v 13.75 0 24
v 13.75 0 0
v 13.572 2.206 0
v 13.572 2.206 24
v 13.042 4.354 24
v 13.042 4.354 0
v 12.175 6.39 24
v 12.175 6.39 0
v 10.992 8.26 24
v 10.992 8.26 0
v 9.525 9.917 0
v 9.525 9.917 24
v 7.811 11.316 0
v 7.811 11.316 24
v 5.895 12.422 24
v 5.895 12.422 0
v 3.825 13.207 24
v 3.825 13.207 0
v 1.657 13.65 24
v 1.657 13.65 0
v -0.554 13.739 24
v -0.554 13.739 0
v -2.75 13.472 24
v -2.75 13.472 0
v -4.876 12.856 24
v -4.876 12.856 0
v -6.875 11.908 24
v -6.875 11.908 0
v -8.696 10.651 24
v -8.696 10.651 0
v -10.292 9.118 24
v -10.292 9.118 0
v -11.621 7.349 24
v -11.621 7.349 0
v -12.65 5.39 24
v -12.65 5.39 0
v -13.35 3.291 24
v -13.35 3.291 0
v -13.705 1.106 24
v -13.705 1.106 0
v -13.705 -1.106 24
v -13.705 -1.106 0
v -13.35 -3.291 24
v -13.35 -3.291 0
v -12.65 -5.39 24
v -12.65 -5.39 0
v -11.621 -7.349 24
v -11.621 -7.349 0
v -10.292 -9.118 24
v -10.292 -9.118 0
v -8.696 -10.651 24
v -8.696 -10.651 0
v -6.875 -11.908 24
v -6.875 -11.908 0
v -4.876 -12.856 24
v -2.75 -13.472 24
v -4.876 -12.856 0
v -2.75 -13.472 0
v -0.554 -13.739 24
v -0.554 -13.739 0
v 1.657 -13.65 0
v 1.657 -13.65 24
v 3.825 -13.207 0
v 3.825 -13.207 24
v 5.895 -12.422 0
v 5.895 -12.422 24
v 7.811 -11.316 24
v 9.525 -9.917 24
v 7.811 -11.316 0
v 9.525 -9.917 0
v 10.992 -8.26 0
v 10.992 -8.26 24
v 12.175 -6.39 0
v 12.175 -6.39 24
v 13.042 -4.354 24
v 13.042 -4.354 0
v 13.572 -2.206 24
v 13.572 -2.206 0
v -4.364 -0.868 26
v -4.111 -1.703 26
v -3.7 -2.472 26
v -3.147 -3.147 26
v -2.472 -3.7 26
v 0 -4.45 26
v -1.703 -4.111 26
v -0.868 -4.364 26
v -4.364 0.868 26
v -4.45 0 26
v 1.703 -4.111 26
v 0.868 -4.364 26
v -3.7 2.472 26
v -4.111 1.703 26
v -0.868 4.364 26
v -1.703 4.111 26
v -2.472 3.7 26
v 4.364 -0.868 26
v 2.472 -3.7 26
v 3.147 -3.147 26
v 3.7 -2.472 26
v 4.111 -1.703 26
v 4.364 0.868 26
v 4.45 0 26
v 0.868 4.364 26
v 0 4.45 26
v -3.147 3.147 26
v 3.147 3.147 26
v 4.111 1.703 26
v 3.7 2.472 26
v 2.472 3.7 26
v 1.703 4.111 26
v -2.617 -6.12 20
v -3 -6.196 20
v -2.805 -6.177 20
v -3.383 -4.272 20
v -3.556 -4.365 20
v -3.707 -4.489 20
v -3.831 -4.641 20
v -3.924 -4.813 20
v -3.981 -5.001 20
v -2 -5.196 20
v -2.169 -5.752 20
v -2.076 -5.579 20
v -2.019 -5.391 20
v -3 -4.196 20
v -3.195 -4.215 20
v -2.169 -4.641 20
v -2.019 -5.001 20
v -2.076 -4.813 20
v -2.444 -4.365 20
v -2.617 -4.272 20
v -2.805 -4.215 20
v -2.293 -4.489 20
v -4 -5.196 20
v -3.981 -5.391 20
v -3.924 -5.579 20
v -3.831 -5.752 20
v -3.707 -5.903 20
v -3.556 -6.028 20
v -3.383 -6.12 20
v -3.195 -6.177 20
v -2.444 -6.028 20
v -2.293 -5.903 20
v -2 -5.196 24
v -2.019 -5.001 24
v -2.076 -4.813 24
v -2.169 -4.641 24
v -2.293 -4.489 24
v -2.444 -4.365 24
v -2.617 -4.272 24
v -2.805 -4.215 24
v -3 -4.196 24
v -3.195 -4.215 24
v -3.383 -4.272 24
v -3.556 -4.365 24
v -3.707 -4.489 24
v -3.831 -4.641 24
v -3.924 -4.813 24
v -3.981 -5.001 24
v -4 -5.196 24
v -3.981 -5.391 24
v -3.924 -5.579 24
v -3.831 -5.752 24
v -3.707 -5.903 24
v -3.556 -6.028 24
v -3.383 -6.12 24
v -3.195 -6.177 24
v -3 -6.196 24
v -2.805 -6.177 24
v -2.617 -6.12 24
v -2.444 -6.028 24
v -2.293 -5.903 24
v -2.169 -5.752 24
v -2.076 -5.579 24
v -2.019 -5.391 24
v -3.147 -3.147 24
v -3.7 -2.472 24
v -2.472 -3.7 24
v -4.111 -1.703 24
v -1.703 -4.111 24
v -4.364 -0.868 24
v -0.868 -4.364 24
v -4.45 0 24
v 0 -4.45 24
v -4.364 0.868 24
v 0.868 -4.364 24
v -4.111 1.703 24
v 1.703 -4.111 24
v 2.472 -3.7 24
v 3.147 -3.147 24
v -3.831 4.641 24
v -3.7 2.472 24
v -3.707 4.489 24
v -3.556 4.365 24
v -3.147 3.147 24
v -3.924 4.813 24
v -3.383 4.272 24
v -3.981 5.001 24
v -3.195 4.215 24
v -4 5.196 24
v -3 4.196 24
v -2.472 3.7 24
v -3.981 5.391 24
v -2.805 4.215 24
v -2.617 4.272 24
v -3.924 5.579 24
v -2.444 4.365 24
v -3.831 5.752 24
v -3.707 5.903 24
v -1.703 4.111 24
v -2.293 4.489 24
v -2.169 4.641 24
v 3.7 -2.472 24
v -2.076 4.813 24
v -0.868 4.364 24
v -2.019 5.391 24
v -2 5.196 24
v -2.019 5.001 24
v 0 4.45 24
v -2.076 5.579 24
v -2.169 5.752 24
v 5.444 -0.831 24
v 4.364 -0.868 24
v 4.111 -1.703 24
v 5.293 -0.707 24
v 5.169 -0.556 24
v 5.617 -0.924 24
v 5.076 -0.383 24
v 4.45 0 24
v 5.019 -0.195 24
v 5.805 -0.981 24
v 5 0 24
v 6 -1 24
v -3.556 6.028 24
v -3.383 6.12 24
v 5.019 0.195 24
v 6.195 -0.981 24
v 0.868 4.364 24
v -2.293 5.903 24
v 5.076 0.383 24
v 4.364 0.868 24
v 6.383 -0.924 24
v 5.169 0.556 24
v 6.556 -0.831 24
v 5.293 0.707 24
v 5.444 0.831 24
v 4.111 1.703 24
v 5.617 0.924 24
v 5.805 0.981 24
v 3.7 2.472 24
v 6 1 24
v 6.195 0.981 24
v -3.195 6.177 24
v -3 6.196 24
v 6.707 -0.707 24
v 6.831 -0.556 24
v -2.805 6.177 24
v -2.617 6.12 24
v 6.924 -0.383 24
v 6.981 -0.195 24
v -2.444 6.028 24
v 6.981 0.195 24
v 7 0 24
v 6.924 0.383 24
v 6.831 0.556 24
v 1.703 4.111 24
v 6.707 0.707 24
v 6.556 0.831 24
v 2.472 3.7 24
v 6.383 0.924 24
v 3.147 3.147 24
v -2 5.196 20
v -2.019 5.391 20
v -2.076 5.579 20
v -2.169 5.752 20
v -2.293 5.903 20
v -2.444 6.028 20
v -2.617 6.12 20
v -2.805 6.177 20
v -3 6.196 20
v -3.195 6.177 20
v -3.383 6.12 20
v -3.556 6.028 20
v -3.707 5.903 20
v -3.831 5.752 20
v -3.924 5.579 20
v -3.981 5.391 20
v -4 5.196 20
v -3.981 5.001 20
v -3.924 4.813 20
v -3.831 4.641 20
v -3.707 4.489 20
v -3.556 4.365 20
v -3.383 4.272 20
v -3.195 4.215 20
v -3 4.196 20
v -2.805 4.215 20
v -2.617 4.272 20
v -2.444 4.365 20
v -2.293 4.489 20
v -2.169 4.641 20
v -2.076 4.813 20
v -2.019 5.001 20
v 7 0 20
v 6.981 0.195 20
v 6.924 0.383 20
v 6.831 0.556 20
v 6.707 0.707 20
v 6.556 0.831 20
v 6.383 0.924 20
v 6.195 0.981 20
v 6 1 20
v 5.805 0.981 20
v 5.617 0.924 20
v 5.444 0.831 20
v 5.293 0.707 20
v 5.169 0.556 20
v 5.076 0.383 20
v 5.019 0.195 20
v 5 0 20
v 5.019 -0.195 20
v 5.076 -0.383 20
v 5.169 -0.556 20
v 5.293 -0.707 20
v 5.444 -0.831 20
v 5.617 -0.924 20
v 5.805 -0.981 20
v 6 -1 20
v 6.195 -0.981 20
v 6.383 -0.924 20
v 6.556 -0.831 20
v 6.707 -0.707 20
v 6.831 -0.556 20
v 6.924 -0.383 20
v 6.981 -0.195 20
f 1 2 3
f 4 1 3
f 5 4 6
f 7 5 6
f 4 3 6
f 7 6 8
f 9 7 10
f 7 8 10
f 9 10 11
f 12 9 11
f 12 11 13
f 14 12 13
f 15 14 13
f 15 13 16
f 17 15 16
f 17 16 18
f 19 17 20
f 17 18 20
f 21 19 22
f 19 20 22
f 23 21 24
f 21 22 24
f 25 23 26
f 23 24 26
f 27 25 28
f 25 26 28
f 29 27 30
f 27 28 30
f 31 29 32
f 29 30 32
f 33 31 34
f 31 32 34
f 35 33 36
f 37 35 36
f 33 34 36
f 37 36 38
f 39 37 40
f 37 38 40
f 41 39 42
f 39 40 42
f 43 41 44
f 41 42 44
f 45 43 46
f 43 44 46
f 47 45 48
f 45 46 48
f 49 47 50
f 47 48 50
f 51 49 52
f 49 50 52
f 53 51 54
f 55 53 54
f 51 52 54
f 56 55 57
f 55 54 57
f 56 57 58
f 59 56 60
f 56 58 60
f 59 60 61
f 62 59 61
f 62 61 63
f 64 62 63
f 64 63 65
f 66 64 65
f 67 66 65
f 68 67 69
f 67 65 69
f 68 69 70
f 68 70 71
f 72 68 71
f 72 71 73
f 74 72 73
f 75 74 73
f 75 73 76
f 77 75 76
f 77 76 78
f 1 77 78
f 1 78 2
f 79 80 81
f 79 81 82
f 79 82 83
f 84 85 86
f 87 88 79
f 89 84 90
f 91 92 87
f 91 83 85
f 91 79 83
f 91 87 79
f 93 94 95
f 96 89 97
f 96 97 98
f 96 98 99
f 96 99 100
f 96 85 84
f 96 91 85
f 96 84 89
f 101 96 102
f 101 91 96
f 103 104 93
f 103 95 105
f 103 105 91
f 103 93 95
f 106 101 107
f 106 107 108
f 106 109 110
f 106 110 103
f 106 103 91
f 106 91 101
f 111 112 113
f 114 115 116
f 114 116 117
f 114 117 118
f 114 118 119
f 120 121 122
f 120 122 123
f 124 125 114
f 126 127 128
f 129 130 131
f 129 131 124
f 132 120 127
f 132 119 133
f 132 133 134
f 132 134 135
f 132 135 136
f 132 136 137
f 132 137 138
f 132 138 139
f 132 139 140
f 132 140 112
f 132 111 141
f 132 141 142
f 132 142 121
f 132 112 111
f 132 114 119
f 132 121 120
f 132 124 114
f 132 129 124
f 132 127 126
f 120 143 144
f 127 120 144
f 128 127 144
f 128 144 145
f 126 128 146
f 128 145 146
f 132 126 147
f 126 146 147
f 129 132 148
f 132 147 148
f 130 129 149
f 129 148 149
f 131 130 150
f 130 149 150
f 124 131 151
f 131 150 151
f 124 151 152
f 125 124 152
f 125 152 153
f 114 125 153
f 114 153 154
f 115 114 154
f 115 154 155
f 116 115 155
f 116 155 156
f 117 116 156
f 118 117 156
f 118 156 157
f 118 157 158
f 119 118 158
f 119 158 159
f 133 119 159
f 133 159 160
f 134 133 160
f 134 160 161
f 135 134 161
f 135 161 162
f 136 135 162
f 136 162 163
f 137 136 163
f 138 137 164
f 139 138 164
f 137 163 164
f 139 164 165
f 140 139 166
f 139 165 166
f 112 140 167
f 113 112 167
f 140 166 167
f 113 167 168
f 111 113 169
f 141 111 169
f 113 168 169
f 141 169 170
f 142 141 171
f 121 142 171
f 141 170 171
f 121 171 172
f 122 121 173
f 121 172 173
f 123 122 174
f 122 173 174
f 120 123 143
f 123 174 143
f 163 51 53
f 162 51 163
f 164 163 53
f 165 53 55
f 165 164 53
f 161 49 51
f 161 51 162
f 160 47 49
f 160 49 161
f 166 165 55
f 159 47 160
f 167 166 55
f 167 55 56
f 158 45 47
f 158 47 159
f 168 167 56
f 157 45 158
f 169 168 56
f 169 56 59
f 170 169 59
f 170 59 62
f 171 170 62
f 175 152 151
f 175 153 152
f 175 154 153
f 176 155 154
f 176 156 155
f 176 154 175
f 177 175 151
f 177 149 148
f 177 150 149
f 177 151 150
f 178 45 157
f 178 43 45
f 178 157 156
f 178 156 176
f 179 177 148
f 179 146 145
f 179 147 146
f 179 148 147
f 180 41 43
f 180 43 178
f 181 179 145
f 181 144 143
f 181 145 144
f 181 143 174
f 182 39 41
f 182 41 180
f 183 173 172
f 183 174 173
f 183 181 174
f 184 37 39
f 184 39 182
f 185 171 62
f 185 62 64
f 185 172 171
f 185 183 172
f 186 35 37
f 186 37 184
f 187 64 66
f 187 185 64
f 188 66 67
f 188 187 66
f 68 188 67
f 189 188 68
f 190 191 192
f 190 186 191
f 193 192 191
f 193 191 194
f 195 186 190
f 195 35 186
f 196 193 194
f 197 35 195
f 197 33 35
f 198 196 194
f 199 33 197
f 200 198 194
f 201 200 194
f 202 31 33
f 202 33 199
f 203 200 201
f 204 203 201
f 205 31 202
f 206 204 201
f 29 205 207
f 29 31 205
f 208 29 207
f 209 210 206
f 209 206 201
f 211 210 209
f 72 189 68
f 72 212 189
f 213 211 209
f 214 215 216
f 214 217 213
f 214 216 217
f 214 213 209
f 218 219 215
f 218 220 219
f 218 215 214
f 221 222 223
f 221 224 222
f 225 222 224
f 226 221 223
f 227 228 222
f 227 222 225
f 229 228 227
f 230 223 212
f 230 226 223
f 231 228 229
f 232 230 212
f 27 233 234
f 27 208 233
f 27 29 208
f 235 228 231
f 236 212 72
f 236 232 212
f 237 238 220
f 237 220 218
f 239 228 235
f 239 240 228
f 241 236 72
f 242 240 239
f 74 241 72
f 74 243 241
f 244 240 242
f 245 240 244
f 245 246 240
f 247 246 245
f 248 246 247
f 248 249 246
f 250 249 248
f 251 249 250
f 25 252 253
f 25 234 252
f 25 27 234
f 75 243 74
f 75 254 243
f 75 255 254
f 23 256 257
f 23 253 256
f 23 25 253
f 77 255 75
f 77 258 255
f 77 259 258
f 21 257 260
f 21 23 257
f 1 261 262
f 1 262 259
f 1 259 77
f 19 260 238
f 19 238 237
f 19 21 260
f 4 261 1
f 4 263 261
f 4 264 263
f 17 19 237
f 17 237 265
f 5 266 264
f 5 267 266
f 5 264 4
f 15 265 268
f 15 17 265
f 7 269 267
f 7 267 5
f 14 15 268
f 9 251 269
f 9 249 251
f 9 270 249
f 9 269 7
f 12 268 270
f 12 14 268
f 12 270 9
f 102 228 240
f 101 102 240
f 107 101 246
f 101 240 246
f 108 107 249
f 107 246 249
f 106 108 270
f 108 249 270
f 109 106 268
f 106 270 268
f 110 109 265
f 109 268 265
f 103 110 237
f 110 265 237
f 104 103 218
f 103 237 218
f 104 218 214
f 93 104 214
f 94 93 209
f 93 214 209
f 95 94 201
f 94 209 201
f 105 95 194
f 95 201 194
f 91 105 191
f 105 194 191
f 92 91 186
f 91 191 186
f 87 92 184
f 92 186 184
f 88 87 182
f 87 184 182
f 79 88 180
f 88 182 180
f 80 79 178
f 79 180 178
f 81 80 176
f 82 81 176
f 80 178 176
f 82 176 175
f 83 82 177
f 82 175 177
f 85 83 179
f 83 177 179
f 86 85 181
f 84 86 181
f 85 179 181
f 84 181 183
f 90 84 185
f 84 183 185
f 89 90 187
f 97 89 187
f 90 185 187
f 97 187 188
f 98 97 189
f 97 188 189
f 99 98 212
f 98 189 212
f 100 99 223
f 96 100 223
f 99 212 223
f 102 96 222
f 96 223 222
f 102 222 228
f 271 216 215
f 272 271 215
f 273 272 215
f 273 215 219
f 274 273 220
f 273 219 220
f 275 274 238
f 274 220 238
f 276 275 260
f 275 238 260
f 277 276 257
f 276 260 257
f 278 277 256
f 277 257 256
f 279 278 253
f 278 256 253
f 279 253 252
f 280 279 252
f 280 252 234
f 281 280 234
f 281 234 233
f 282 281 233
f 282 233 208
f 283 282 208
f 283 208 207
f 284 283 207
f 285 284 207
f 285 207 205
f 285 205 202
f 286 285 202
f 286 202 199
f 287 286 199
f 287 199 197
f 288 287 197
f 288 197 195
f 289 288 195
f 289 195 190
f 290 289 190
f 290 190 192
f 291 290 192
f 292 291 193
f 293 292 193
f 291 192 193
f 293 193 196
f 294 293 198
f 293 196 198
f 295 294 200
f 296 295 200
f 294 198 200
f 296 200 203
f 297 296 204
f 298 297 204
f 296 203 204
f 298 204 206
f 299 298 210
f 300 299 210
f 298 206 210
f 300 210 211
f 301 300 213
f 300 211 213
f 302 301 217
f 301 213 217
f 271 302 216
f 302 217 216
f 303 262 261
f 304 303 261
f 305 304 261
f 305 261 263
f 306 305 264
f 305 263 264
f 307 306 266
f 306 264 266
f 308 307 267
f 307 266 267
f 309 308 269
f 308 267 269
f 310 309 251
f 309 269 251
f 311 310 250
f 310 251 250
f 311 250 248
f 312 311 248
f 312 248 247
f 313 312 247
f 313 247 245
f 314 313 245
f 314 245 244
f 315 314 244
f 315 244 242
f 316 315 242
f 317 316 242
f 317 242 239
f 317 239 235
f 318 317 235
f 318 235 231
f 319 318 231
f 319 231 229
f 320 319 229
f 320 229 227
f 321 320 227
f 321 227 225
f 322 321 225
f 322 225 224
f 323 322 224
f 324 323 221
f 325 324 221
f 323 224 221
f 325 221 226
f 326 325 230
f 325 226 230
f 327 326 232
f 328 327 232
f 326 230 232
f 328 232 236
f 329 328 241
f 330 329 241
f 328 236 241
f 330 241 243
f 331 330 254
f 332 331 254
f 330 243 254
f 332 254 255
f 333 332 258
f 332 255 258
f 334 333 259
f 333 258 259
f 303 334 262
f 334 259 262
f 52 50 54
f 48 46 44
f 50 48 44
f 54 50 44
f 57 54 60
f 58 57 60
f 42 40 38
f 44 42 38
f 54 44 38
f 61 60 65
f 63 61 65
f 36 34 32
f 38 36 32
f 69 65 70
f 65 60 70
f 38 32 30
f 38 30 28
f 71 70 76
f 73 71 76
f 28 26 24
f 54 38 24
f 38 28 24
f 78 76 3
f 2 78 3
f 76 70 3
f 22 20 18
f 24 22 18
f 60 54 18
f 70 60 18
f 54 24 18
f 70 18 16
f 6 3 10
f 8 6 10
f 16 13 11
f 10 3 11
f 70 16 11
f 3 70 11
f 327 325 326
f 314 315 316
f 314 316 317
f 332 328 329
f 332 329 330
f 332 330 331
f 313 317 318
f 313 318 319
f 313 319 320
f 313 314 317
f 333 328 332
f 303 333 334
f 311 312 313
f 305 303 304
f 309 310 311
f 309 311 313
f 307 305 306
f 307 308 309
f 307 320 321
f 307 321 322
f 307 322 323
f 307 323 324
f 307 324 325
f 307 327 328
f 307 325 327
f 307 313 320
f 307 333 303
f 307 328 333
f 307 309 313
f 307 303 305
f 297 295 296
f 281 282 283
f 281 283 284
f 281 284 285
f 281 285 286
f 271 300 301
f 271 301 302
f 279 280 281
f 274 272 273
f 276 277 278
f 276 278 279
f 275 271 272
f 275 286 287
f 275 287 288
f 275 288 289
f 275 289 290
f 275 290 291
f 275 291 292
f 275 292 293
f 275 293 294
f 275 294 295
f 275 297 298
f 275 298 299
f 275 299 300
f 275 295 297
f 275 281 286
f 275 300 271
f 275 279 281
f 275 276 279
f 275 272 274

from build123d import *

# Parameters (mm, degrees)
SKETCH_1_R          = 13.75
EXTRUDE_1_DEPTH     = 24
SKETCH_2_R          = 4.45
EXTRUDE_2_DEPTH     = 2
SKETCH_3_R          = 1
CUT_EXTRUDE_1_DEPTH = 6


with BuildPart() as part:
    # 草图1 → 凸台-拉伸1 (new body)
    with BuildSketch(Plane.XY):
        Circle(SKETCH_1_R)
    extrude(amount=EXTRUDE_1_DEPTH)

    # 草图2 → 凸台-拉伸2 (add)
    with BuildSketch(Plane.XY.offset(24)):
        Circle(SKETCH_2_R)
    extrude(amount=EXTRUDE_2_DEPTH)

    # 草图3 → 切除-拉伸1 (cut)
    with BuildSketch(Plane.XY.offset(26)):
        with Locations((6, 0)):
            Circle(SKETCH_3_R)
        with Locations((-3, -5.196152423)):
            Circle(SKETCH_3_R)
        with Locations((-3, 5.196152423)):
            Circle(SKETCH_3_R)
    extrude(amount=-CUT_EXTRUDE_1_DEPTH, mode=Mode.SUBTRACT)


solid = part.part
